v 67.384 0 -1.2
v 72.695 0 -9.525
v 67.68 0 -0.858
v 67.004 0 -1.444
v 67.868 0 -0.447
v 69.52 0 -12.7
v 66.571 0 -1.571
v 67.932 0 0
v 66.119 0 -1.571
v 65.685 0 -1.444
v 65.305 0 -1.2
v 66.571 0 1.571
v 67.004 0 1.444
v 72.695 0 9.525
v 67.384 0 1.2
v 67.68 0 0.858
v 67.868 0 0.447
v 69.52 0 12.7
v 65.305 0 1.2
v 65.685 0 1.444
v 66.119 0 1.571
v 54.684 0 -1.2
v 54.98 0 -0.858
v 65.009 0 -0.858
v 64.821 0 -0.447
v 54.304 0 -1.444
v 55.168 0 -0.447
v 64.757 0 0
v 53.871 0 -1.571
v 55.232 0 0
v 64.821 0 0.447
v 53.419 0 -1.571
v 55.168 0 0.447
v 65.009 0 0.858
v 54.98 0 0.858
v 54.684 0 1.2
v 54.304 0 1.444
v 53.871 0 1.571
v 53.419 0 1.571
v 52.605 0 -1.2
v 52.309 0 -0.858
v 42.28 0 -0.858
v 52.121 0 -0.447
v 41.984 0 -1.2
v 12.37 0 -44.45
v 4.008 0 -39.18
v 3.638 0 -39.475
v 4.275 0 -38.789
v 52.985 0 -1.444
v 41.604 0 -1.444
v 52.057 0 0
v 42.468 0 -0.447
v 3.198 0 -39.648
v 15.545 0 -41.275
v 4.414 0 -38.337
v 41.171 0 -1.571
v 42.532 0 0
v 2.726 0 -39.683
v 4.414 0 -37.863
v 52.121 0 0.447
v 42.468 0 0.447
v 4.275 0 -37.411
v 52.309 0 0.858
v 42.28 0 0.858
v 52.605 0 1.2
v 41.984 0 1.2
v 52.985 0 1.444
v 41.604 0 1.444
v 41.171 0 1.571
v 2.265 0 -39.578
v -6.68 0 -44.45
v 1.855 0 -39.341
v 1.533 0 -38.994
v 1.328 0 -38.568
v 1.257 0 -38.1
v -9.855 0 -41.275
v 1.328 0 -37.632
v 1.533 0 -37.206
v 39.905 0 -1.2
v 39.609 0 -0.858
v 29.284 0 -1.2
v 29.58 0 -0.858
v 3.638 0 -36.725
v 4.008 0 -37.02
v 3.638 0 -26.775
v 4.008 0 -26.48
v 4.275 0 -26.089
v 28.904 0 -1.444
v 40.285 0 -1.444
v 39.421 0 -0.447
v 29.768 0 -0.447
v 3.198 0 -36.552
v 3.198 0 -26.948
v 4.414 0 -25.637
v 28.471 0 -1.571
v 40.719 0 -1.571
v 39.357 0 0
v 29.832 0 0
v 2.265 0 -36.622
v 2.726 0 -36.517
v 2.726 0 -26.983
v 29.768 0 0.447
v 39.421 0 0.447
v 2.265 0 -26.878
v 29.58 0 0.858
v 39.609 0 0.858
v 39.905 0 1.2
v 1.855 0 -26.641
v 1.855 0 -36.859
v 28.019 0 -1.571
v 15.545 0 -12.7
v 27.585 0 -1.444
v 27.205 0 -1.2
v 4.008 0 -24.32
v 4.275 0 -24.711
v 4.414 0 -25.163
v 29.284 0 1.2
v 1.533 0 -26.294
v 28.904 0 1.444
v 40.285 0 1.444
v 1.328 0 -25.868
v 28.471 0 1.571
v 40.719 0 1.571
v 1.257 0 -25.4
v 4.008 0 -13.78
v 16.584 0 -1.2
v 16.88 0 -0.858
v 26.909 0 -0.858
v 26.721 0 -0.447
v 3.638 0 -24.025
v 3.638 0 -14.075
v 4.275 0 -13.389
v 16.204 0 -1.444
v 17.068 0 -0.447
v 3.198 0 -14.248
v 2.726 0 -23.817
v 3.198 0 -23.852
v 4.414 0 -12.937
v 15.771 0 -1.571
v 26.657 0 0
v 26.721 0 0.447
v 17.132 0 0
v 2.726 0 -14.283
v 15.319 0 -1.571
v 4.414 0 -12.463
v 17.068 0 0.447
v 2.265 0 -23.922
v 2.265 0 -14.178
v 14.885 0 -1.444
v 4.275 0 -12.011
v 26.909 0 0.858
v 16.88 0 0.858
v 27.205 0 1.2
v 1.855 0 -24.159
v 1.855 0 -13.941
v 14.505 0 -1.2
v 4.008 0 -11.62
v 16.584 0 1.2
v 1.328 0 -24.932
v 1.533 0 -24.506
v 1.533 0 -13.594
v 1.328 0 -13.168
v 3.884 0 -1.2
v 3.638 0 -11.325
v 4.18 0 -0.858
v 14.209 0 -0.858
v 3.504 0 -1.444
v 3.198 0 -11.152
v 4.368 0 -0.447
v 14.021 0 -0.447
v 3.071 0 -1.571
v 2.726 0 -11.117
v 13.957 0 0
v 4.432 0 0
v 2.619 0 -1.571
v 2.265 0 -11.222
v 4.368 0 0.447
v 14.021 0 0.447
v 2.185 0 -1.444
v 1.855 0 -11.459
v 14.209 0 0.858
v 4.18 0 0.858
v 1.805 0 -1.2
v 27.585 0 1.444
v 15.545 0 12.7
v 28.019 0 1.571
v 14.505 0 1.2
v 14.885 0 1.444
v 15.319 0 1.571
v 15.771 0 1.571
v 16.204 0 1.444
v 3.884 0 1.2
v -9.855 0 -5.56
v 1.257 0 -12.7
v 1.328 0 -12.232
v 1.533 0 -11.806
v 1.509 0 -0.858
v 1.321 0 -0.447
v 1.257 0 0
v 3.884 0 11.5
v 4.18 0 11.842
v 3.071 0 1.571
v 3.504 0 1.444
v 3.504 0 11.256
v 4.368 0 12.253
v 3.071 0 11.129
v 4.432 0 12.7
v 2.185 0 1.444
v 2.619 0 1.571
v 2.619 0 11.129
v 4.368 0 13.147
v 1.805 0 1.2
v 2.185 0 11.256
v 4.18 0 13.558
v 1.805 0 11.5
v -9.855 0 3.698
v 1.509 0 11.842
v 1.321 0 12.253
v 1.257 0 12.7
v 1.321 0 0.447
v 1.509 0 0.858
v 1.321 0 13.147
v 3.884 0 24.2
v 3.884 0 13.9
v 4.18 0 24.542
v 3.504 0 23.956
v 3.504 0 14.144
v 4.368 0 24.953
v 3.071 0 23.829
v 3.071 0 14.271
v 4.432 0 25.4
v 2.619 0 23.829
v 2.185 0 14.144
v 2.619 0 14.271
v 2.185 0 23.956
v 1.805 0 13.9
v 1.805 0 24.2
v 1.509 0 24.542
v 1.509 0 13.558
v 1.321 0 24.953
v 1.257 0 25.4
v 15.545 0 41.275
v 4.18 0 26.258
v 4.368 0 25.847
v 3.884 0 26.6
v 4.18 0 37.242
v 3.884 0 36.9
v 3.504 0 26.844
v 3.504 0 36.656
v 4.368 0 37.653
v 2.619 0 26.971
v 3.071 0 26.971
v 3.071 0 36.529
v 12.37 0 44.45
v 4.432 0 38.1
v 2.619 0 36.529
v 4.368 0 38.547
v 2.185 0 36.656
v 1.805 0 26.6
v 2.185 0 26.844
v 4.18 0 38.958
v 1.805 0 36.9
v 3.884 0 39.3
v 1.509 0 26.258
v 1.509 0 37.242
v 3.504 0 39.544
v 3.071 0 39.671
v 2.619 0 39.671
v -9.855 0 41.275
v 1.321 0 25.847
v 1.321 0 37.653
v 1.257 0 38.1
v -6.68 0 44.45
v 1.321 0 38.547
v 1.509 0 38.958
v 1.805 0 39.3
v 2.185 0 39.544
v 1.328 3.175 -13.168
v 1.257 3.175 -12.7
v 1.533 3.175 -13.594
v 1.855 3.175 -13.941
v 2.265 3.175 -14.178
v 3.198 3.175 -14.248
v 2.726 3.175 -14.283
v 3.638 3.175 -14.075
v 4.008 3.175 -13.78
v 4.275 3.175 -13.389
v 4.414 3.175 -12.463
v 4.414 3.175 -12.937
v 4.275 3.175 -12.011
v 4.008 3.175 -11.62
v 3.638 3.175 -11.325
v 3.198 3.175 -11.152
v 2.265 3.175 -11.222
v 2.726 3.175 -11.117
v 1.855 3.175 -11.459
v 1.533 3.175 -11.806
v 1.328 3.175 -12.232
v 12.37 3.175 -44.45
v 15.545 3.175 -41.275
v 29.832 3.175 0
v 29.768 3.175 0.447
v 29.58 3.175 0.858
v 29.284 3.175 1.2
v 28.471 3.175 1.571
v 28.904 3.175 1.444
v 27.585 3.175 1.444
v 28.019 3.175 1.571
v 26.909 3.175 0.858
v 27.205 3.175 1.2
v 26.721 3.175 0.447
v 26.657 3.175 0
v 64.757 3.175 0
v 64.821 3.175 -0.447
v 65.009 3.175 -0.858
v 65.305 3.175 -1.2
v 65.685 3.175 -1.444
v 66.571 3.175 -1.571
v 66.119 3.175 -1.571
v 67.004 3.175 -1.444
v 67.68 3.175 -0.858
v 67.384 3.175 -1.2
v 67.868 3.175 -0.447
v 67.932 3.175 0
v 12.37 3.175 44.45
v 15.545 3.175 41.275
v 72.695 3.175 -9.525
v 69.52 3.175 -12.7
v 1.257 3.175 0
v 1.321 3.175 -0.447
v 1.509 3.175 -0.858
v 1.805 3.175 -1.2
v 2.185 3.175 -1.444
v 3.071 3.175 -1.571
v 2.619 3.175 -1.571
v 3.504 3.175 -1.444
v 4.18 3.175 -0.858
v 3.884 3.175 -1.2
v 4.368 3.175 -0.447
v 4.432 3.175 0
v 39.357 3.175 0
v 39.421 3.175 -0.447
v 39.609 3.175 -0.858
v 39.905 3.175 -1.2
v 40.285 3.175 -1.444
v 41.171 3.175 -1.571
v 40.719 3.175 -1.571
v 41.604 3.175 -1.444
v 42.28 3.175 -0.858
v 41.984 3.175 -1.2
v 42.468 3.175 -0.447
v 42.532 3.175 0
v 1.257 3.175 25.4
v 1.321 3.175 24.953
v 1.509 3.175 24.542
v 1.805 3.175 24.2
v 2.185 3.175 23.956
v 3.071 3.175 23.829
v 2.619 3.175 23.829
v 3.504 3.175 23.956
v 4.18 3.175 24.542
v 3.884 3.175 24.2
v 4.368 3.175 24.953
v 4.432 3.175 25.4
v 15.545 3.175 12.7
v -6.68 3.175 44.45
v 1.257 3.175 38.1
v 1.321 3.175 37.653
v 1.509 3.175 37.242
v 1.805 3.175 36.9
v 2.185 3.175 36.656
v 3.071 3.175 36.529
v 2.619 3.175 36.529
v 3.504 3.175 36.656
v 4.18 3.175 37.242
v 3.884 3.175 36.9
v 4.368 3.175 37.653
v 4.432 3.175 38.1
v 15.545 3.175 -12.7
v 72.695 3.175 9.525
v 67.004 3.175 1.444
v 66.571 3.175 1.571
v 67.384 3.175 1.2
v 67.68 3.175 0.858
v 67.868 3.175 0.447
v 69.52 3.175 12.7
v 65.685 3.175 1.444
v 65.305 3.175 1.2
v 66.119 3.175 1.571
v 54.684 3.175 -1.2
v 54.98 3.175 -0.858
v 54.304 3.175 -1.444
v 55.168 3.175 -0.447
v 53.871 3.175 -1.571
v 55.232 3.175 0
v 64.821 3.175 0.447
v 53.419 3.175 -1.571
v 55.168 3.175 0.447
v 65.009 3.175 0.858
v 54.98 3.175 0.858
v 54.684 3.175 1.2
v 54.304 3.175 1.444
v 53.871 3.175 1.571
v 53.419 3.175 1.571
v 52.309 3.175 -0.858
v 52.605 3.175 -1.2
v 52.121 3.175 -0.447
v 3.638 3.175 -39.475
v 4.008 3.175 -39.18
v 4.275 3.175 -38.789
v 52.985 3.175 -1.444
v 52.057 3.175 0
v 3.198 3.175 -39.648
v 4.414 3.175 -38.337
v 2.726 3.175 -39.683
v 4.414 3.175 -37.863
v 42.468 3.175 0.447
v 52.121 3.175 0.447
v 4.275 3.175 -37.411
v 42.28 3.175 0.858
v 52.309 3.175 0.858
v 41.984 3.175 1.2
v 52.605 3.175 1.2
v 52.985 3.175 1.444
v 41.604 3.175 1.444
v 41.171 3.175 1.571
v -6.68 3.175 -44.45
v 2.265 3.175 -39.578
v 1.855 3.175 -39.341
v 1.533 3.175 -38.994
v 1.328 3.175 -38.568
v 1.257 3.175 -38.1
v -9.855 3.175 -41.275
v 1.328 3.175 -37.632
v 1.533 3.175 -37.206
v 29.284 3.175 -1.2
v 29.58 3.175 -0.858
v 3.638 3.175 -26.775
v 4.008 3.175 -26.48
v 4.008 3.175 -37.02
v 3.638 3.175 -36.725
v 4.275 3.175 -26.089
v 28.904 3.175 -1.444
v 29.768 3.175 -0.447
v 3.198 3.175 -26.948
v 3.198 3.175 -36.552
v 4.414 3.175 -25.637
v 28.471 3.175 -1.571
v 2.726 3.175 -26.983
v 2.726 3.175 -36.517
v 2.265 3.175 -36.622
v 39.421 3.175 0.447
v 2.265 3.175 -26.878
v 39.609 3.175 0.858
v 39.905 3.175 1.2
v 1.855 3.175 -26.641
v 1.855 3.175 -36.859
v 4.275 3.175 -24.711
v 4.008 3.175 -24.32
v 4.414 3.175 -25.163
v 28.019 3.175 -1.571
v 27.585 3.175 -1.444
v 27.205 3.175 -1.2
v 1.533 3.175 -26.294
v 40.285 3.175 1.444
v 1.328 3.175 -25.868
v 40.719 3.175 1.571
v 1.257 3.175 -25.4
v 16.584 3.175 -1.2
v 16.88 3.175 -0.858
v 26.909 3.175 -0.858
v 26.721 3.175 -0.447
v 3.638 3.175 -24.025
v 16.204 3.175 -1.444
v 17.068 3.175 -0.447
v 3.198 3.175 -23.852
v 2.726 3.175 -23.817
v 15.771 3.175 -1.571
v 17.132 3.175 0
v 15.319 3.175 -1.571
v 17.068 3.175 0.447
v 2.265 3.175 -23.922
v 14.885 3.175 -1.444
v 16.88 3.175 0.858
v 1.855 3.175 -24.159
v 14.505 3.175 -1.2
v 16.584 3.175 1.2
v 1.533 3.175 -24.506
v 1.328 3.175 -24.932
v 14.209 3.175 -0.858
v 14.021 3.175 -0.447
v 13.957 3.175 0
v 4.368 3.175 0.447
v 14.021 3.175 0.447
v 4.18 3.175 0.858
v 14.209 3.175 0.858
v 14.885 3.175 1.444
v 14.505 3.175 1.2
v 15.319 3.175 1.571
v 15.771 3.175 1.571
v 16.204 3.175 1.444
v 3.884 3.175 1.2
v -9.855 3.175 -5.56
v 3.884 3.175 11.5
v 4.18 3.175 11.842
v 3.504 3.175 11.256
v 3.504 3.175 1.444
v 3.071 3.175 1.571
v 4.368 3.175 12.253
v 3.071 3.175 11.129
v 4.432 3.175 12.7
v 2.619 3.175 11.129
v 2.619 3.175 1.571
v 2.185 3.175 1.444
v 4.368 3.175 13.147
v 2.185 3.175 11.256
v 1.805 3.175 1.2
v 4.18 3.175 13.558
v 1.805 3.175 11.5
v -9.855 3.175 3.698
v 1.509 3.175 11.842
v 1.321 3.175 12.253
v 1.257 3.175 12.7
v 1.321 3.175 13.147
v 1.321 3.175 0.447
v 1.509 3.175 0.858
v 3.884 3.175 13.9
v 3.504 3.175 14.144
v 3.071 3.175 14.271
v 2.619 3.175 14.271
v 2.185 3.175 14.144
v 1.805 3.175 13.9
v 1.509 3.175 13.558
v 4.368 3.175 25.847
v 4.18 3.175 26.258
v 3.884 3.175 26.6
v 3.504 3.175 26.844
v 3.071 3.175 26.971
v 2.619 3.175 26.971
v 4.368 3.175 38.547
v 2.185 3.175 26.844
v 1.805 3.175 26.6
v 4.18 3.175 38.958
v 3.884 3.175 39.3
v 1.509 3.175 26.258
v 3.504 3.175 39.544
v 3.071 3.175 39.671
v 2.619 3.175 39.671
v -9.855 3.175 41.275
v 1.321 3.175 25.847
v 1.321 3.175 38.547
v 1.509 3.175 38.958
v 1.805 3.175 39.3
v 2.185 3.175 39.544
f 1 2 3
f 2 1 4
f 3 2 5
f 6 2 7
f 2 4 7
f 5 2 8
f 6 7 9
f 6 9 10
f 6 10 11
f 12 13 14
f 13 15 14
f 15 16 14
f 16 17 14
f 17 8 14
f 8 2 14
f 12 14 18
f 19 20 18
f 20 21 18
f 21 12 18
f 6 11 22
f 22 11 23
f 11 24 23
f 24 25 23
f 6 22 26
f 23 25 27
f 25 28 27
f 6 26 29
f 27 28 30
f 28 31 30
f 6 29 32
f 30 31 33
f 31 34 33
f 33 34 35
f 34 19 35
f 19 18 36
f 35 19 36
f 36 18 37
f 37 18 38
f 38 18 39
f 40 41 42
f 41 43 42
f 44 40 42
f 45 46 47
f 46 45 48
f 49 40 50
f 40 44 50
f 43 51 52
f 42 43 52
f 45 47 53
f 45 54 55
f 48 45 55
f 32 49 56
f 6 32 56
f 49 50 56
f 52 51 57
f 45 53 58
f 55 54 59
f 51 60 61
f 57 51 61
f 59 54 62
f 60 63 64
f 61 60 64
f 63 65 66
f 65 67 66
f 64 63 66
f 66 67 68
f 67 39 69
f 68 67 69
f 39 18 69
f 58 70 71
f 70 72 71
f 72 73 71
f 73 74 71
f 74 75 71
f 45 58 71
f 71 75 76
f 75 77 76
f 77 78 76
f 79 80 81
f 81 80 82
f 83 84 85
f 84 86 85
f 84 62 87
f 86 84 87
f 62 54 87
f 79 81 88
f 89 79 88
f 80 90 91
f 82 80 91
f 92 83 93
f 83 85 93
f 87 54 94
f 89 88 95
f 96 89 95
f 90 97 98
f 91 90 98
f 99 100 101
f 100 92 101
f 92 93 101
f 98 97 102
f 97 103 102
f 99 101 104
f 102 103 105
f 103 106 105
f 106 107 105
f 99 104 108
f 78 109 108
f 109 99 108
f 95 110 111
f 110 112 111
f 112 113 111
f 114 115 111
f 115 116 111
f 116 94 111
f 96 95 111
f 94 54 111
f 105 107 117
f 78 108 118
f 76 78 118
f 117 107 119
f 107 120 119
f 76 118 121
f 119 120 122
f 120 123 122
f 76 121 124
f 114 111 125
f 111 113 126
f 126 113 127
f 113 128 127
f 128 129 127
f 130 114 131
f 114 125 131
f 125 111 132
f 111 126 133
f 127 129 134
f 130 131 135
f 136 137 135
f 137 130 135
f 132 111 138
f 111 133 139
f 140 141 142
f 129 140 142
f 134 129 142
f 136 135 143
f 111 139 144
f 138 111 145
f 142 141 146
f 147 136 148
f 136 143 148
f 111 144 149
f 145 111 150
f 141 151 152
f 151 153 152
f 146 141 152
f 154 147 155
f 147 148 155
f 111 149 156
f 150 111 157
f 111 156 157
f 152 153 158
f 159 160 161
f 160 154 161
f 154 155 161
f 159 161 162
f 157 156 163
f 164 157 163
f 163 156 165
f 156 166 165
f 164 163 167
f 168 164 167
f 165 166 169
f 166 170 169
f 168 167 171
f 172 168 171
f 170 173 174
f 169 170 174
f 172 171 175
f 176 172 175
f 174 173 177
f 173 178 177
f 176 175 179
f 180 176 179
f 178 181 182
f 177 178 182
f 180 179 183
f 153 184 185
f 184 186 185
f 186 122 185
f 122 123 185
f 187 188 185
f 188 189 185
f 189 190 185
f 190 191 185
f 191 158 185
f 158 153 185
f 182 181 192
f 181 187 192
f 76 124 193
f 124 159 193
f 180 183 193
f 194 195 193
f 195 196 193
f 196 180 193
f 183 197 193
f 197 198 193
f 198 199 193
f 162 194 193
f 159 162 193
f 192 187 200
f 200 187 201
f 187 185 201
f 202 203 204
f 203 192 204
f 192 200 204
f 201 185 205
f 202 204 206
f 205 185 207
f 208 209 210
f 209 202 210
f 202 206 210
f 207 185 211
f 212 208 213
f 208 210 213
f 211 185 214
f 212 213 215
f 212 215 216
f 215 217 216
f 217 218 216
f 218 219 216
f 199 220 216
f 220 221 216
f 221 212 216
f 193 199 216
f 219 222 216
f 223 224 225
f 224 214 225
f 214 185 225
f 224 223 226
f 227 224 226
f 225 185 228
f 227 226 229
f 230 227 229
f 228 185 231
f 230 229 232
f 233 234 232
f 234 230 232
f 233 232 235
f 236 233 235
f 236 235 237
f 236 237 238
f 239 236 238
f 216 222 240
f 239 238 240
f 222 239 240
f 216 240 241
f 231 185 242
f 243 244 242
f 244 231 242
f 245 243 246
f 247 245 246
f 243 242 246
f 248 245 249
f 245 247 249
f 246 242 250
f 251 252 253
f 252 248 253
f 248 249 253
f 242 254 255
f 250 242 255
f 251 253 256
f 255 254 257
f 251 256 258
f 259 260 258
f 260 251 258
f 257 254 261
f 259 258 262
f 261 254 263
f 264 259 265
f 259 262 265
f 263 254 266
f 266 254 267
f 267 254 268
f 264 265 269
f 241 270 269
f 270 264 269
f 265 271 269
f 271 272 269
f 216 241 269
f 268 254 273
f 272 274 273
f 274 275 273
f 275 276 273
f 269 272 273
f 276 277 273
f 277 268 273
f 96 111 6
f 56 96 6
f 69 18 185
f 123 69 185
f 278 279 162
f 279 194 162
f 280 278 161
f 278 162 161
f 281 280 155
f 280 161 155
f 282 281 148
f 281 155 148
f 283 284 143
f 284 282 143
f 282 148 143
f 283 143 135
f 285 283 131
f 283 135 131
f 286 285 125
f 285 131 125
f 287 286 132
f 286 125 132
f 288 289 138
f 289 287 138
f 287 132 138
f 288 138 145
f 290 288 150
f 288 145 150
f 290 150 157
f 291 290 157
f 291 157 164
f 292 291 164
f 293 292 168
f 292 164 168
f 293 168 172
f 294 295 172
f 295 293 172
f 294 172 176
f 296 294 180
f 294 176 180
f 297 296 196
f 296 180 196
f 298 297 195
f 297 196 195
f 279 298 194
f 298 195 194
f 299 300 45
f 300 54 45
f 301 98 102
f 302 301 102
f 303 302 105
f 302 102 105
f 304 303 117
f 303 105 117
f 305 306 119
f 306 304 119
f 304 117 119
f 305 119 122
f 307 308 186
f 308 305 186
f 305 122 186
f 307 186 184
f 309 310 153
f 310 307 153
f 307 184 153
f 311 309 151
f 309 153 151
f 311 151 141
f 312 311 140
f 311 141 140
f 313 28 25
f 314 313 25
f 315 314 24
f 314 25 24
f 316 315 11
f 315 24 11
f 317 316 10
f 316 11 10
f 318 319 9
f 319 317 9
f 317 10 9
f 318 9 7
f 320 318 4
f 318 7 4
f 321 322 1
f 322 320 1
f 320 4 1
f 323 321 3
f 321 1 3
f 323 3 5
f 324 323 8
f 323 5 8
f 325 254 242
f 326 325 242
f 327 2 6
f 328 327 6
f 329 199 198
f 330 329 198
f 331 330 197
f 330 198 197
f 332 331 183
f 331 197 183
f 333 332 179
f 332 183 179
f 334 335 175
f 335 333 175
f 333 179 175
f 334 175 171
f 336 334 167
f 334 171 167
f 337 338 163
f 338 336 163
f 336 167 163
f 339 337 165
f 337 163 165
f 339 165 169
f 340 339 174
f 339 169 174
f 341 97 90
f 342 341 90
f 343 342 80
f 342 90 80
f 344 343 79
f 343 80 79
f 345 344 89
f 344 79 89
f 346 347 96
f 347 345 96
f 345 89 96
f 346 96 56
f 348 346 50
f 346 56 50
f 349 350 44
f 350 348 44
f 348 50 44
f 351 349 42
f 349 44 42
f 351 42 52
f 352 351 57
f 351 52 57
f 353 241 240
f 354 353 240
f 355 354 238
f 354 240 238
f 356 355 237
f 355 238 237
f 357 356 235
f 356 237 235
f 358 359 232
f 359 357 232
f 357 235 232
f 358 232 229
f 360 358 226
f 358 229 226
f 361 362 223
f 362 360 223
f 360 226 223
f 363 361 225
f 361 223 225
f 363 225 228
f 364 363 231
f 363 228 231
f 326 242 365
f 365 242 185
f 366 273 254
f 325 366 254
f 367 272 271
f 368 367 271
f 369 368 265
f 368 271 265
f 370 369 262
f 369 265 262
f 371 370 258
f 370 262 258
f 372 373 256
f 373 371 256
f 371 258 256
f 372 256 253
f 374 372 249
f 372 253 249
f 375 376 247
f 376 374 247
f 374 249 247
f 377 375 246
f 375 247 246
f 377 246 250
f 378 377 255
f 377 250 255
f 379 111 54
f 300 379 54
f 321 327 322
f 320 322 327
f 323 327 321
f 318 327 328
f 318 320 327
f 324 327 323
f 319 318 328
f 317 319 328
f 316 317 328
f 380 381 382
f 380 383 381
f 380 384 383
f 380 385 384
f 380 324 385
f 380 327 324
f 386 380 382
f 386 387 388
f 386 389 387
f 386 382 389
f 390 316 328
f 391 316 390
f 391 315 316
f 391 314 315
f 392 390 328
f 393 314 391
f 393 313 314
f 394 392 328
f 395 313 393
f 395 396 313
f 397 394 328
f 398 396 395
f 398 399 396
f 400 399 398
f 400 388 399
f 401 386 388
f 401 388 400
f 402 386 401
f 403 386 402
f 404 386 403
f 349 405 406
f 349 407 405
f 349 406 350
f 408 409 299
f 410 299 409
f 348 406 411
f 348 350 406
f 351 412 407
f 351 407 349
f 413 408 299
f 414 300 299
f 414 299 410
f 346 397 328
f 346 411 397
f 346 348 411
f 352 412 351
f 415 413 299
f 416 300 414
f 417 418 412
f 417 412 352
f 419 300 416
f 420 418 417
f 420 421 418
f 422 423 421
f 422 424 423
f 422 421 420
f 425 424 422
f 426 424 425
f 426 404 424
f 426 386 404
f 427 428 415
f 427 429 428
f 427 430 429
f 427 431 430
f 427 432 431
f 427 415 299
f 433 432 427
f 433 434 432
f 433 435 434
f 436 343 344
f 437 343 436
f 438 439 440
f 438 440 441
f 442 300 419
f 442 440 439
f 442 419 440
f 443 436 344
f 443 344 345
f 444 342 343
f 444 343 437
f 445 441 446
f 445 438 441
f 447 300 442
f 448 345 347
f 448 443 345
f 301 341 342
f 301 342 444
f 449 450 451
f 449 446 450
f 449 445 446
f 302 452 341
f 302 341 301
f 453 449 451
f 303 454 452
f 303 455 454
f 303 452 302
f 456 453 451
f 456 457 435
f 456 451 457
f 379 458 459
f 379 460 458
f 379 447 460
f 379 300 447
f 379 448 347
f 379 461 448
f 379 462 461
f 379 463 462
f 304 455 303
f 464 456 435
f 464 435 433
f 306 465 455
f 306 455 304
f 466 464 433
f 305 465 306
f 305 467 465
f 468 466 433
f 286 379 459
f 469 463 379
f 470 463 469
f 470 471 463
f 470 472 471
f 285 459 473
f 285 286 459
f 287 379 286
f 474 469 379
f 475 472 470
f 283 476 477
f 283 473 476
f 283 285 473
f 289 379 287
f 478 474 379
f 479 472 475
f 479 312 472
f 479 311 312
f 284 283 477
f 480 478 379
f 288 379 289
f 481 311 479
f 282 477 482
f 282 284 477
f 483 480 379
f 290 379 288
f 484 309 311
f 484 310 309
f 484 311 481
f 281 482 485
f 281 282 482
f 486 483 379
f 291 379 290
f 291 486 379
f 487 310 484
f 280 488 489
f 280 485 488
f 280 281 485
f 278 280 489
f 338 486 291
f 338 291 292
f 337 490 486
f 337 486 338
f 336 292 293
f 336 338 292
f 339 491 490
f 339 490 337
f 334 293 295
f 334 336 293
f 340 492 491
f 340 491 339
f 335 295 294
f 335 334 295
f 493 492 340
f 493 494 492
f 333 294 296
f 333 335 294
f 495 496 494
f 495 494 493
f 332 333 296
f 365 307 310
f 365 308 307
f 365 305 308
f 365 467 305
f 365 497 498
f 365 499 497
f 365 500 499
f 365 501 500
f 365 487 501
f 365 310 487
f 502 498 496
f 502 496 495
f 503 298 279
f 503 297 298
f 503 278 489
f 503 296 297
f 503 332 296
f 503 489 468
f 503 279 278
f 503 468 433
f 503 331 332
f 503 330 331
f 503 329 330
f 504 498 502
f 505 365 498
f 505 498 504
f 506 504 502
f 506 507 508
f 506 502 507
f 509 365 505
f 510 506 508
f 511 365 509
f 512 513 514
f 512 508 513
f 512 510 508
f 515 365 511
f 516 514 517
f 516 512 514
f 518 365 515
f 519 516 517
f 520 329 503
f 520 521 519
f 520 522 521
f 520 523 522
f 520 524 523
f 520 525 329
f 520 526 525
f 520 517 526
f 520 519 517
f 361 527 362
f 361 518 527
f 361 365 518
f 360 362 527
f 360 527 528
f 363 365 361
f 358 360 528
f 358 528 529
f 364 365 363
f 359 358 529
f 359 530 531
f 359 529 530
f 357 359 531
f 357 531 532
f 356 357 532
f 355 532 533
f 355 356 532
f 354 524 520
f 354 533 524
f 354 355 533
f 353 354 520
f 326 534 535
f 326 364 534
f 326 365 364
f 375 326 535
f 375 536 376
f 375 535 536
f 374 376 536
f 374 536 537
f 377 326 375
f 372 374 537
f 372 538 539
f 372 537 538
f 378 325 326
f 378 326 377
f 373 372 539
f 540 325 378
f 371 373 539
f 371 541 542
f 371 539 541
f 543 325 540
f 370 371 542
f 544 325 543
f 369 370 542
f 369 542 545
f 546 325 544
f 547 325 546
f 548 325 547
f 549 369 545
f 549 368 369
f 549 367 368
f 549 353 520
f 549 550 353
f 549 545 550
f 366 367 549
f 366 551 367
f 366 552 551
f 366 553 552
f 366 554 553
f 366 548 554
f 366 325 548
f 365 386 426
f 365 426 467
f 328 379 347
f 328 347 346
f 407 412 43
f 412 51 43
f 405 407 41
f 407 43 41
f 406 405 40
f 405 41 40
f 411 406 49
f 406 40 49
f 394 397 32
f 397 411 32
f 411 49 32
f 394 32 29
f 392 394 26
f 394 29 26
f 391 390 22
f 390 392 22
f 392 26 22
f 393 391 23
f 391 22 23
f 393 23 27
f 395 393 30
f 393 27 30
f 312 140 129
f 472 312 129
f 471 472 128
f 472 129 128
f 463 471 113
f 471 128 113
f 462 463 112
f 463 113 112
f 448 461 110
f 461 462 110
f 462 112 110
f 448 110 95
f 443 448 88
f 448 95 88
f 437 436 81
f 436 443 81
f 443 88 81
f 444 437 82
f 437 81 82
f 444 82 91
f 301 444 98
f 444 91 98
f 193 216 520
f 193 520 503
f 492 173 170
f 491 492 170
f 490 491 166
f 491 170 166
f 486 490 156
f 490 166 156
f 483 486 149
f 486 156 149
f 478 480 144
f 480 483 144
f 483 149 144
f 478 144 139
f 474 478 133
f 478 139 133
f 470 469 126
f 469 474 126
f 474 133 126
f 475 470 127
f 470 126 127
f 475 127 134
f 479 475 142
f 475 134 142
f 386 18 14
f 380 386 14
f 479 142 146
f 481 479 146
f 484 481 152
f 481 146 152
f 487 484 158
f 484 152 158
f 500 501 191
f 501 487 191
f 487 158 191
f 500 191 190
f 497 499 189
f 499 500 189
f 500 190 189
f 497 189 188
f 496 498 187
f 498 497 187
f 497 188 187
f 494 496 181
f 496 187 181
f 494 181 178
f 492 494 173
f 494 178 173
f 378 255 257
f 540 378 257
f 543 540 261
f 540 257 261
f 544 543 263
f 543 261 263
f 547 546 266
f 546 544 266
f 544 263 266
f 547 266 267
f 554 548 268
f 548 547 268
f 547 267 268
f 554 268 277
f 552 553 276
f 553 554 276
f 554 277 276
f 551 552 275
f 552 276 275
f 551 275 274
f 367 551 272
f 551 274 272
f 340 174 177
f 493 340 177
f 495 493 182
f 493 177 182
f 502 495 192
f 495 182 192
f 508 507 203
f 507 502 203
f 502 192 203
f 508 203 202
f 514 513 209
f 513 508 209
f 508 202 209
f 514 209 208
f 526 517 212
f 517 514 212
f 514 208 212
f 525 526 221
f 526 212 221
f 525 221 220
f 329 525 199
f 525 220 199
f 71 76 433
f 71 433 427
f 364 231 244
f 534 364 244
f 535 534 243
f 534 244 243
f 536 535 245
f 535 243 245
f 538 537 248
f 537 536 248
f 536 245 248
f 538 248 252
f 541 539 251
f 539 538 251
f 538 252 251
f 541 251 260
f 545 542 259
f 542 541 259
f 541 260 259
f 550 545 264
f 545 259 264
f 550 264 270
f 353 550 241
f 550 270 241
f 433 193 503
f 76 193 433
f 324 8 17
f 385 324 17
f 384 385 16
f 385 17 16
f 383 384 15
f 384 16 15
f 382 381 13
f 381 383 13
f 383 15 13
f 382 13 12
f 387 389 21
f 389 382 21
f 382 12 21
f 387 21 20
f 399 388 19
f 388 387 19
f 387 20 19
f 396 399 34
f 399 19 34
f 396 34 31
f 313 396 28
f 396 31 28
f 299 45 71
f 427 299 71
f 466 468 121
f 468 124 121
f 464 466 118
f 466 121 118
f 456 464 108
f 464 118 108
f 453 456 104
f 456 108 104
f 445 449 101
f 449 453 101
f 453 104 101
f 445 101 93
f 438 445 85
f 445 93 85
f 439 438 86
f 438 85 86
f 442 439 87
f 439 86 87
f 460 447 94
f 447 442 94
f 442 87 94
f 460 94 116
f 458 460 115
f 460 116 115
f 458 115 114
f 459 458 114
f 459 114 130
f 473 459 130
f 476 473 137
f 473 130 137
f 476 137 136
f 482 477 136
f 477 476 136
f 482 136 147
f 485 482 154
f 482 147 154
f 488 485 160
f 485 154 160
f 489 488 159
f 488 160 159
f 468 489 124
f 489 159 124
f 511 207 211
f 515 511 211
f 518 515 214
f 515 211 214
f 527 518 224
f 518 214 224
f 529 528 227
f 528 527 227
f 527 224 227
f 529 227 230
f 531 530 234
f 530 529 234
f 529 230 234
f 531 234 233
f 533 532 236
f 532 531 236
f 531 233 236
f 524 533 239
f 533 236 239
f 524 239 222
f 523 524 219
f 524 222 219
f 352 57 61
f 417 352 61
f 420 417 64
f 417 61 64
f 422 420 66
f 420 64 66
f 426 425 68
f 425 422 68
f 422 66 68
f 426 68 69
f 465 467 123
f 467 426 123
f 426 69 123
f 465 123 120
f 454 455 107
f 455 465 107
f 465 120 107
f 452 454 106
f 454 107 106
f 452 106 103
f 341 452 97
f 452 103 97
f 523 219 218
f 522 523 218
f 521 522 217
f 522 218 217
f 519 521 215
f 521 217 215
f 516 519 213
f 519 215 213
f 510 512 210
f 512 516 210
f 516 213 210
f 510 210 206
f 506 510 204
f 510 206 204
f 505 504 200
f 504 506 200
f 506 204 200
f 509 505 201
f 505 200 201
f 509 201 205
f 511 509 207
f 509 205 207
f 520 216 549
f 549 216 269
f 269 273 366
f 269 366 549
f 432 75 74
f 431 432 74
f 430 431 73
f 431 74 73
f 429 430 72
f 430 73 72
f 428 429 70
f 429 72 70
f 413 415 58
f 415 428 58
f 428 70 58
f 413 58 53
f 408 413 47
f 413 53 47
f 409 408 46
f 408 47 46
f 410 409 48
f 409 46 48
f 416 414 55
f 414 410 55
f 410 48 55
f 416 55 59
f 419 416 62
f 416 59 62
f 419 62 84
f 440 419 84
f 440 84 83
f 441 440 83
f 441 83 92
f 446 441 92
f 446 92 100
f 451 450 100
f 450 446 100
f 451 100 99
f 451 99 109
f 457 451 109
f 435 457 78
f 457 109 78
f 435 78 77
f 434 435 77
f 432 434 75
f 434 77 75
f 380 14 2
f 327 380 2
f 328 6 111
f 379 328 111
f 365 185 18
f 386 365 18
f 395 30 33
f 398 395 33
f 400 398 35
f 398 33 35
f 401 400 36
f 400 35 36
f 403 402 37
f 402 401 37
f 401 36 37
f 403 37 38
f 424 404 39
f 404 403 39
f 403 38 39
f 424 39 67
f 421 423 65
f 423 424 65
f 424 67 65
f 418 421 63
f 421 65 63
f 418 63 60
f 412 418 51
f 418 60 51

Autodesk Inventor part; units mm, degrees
ref_plane "YZ Plane" through (0, 0, 0) normal (1, 0, 0) x (0, 1, 0)
ref_plane "XZ Plane" through (0, 0, 0) normal (0, 1, 0) x (-1, 0, 0)
ref_plane "XY Plane" through (0, 0, 0) normal (0, 0, 1) x (1, 0, 0)
sketch "Sketch1" plane through (0, 0, 0) normal (0, 1, 0) x (-1, 0, 0)
  line L0 (9.8554, 3.698) -> (9.8554, -5.5599)
  line L1 (0, 0) -> (-5.6892, 0)
  circle A0 centre (-2.8446, 0) radius 1.5875
  circle A1 centre (-2.8446, -12.7) radius 1.5875
  circle A2 centre (-2.8446, -25.4) radius 1.5875
  circle A3 centre (-2.8446, -38.1) radius 1.5875
  line L2 (0, 12.7) -> (-5.6892, 12.7)
  circle A4 centre (-2.8446, 12.7) radius 1.5875
  line L3 (0, 25.4) -> (-5.6892, 25.4)
  circle A5 centre (-2.8446, 25.4) radius 1.5875
  line L4 (0, 38.1) -> (-5.6892, 38.1)
  circle A6 centre (-2.8446, 38.1) radius 1.5875
  line L5 (-12.7, 0) -> (-18.3892, 0)
  circle A7 centre (-15.5446, 0) radius 1.5875
  line L6 (-25.4, 0) -> (-31.0892, 0)
  circle A8 centre (-28.2446, 0) radius 1.5875
  line L7 (-38.1, 0) -> (-43.7892, 0)
  circle A9 centre (-40.9446, 0) radius 1.5875
  line L8 (-50.8, 0) -> (-56.4892, 0)
  circle A10 centre (-53.6446, 0) radius 1.5875
  line L9 (-63.5, 0) -> (-69.1892, 0)
  circle A11 centre (-66.3446, 0) radius 1.5875
  line L10 (9.8554, 3.698) -> (9.8554, 44.45)
  line L11 (9.8554, 44.45) -> (-15.5446, 44.45)
  line L12 (-15.5446, 44.45) -> (-15.5446, 12.7)
  line L13 (-15.5446, 12.7) -> (-72.6946, 12.7)
  line L14 (-72.6946, 12.7) -> (-72.6946, -12.7)
  line L15 (-72.6946, -12.7) -> (-15.5446, -12.7)
  line L16 (-15.5446, -12.7) -> (-15.5446, -44.45)
  line L17 (-15.5446, -44.45) -> (9.8554, -44.45)
  line L18 (9.8554, -5.5599) -> (9.8554, -44.45)
  line L19 (-12.3696, 44.45) -> (-15.5446, 41.275)
  line L20 (6.6804, 44.45) -> (9.8554, 41.275)
  line L21 (9.8554, -41.275) -> (6.6804, -44.45)
  line L22 (-15.5446, -41.275) -> (-12.3696, -44.45)
  line L23 (-69.5196, 12.7) -> (-72.6946, 9.525)
  line L24 (-72.6946, -9.525) -> (-69.5196, -12.7)
  point P0 (-72.6946, 0)
  point P1 (-66.3446, 0)
  dimension "d0" = 3.175
  dimension "d1" = 12.7
  dimension "d4" = 12.7
  dimension "d11" = 12.7
  dimension "d18" = 12.7
  dimension "d23" = 25.4
  dimension "d24" = 6.35
  dimension "d25" = 12.7
  dimension "d26" = 6.35
  dimension "d27" = 25.4
extrude "Extrusion1" add sketch "Sketch1" along normal blind 3.175 contours L0 L18 L21 L17 L22 L16 L15 L24 L14 L23 L13 L12 L19 L11 L20 L10
properties part number "T-Bracket"
